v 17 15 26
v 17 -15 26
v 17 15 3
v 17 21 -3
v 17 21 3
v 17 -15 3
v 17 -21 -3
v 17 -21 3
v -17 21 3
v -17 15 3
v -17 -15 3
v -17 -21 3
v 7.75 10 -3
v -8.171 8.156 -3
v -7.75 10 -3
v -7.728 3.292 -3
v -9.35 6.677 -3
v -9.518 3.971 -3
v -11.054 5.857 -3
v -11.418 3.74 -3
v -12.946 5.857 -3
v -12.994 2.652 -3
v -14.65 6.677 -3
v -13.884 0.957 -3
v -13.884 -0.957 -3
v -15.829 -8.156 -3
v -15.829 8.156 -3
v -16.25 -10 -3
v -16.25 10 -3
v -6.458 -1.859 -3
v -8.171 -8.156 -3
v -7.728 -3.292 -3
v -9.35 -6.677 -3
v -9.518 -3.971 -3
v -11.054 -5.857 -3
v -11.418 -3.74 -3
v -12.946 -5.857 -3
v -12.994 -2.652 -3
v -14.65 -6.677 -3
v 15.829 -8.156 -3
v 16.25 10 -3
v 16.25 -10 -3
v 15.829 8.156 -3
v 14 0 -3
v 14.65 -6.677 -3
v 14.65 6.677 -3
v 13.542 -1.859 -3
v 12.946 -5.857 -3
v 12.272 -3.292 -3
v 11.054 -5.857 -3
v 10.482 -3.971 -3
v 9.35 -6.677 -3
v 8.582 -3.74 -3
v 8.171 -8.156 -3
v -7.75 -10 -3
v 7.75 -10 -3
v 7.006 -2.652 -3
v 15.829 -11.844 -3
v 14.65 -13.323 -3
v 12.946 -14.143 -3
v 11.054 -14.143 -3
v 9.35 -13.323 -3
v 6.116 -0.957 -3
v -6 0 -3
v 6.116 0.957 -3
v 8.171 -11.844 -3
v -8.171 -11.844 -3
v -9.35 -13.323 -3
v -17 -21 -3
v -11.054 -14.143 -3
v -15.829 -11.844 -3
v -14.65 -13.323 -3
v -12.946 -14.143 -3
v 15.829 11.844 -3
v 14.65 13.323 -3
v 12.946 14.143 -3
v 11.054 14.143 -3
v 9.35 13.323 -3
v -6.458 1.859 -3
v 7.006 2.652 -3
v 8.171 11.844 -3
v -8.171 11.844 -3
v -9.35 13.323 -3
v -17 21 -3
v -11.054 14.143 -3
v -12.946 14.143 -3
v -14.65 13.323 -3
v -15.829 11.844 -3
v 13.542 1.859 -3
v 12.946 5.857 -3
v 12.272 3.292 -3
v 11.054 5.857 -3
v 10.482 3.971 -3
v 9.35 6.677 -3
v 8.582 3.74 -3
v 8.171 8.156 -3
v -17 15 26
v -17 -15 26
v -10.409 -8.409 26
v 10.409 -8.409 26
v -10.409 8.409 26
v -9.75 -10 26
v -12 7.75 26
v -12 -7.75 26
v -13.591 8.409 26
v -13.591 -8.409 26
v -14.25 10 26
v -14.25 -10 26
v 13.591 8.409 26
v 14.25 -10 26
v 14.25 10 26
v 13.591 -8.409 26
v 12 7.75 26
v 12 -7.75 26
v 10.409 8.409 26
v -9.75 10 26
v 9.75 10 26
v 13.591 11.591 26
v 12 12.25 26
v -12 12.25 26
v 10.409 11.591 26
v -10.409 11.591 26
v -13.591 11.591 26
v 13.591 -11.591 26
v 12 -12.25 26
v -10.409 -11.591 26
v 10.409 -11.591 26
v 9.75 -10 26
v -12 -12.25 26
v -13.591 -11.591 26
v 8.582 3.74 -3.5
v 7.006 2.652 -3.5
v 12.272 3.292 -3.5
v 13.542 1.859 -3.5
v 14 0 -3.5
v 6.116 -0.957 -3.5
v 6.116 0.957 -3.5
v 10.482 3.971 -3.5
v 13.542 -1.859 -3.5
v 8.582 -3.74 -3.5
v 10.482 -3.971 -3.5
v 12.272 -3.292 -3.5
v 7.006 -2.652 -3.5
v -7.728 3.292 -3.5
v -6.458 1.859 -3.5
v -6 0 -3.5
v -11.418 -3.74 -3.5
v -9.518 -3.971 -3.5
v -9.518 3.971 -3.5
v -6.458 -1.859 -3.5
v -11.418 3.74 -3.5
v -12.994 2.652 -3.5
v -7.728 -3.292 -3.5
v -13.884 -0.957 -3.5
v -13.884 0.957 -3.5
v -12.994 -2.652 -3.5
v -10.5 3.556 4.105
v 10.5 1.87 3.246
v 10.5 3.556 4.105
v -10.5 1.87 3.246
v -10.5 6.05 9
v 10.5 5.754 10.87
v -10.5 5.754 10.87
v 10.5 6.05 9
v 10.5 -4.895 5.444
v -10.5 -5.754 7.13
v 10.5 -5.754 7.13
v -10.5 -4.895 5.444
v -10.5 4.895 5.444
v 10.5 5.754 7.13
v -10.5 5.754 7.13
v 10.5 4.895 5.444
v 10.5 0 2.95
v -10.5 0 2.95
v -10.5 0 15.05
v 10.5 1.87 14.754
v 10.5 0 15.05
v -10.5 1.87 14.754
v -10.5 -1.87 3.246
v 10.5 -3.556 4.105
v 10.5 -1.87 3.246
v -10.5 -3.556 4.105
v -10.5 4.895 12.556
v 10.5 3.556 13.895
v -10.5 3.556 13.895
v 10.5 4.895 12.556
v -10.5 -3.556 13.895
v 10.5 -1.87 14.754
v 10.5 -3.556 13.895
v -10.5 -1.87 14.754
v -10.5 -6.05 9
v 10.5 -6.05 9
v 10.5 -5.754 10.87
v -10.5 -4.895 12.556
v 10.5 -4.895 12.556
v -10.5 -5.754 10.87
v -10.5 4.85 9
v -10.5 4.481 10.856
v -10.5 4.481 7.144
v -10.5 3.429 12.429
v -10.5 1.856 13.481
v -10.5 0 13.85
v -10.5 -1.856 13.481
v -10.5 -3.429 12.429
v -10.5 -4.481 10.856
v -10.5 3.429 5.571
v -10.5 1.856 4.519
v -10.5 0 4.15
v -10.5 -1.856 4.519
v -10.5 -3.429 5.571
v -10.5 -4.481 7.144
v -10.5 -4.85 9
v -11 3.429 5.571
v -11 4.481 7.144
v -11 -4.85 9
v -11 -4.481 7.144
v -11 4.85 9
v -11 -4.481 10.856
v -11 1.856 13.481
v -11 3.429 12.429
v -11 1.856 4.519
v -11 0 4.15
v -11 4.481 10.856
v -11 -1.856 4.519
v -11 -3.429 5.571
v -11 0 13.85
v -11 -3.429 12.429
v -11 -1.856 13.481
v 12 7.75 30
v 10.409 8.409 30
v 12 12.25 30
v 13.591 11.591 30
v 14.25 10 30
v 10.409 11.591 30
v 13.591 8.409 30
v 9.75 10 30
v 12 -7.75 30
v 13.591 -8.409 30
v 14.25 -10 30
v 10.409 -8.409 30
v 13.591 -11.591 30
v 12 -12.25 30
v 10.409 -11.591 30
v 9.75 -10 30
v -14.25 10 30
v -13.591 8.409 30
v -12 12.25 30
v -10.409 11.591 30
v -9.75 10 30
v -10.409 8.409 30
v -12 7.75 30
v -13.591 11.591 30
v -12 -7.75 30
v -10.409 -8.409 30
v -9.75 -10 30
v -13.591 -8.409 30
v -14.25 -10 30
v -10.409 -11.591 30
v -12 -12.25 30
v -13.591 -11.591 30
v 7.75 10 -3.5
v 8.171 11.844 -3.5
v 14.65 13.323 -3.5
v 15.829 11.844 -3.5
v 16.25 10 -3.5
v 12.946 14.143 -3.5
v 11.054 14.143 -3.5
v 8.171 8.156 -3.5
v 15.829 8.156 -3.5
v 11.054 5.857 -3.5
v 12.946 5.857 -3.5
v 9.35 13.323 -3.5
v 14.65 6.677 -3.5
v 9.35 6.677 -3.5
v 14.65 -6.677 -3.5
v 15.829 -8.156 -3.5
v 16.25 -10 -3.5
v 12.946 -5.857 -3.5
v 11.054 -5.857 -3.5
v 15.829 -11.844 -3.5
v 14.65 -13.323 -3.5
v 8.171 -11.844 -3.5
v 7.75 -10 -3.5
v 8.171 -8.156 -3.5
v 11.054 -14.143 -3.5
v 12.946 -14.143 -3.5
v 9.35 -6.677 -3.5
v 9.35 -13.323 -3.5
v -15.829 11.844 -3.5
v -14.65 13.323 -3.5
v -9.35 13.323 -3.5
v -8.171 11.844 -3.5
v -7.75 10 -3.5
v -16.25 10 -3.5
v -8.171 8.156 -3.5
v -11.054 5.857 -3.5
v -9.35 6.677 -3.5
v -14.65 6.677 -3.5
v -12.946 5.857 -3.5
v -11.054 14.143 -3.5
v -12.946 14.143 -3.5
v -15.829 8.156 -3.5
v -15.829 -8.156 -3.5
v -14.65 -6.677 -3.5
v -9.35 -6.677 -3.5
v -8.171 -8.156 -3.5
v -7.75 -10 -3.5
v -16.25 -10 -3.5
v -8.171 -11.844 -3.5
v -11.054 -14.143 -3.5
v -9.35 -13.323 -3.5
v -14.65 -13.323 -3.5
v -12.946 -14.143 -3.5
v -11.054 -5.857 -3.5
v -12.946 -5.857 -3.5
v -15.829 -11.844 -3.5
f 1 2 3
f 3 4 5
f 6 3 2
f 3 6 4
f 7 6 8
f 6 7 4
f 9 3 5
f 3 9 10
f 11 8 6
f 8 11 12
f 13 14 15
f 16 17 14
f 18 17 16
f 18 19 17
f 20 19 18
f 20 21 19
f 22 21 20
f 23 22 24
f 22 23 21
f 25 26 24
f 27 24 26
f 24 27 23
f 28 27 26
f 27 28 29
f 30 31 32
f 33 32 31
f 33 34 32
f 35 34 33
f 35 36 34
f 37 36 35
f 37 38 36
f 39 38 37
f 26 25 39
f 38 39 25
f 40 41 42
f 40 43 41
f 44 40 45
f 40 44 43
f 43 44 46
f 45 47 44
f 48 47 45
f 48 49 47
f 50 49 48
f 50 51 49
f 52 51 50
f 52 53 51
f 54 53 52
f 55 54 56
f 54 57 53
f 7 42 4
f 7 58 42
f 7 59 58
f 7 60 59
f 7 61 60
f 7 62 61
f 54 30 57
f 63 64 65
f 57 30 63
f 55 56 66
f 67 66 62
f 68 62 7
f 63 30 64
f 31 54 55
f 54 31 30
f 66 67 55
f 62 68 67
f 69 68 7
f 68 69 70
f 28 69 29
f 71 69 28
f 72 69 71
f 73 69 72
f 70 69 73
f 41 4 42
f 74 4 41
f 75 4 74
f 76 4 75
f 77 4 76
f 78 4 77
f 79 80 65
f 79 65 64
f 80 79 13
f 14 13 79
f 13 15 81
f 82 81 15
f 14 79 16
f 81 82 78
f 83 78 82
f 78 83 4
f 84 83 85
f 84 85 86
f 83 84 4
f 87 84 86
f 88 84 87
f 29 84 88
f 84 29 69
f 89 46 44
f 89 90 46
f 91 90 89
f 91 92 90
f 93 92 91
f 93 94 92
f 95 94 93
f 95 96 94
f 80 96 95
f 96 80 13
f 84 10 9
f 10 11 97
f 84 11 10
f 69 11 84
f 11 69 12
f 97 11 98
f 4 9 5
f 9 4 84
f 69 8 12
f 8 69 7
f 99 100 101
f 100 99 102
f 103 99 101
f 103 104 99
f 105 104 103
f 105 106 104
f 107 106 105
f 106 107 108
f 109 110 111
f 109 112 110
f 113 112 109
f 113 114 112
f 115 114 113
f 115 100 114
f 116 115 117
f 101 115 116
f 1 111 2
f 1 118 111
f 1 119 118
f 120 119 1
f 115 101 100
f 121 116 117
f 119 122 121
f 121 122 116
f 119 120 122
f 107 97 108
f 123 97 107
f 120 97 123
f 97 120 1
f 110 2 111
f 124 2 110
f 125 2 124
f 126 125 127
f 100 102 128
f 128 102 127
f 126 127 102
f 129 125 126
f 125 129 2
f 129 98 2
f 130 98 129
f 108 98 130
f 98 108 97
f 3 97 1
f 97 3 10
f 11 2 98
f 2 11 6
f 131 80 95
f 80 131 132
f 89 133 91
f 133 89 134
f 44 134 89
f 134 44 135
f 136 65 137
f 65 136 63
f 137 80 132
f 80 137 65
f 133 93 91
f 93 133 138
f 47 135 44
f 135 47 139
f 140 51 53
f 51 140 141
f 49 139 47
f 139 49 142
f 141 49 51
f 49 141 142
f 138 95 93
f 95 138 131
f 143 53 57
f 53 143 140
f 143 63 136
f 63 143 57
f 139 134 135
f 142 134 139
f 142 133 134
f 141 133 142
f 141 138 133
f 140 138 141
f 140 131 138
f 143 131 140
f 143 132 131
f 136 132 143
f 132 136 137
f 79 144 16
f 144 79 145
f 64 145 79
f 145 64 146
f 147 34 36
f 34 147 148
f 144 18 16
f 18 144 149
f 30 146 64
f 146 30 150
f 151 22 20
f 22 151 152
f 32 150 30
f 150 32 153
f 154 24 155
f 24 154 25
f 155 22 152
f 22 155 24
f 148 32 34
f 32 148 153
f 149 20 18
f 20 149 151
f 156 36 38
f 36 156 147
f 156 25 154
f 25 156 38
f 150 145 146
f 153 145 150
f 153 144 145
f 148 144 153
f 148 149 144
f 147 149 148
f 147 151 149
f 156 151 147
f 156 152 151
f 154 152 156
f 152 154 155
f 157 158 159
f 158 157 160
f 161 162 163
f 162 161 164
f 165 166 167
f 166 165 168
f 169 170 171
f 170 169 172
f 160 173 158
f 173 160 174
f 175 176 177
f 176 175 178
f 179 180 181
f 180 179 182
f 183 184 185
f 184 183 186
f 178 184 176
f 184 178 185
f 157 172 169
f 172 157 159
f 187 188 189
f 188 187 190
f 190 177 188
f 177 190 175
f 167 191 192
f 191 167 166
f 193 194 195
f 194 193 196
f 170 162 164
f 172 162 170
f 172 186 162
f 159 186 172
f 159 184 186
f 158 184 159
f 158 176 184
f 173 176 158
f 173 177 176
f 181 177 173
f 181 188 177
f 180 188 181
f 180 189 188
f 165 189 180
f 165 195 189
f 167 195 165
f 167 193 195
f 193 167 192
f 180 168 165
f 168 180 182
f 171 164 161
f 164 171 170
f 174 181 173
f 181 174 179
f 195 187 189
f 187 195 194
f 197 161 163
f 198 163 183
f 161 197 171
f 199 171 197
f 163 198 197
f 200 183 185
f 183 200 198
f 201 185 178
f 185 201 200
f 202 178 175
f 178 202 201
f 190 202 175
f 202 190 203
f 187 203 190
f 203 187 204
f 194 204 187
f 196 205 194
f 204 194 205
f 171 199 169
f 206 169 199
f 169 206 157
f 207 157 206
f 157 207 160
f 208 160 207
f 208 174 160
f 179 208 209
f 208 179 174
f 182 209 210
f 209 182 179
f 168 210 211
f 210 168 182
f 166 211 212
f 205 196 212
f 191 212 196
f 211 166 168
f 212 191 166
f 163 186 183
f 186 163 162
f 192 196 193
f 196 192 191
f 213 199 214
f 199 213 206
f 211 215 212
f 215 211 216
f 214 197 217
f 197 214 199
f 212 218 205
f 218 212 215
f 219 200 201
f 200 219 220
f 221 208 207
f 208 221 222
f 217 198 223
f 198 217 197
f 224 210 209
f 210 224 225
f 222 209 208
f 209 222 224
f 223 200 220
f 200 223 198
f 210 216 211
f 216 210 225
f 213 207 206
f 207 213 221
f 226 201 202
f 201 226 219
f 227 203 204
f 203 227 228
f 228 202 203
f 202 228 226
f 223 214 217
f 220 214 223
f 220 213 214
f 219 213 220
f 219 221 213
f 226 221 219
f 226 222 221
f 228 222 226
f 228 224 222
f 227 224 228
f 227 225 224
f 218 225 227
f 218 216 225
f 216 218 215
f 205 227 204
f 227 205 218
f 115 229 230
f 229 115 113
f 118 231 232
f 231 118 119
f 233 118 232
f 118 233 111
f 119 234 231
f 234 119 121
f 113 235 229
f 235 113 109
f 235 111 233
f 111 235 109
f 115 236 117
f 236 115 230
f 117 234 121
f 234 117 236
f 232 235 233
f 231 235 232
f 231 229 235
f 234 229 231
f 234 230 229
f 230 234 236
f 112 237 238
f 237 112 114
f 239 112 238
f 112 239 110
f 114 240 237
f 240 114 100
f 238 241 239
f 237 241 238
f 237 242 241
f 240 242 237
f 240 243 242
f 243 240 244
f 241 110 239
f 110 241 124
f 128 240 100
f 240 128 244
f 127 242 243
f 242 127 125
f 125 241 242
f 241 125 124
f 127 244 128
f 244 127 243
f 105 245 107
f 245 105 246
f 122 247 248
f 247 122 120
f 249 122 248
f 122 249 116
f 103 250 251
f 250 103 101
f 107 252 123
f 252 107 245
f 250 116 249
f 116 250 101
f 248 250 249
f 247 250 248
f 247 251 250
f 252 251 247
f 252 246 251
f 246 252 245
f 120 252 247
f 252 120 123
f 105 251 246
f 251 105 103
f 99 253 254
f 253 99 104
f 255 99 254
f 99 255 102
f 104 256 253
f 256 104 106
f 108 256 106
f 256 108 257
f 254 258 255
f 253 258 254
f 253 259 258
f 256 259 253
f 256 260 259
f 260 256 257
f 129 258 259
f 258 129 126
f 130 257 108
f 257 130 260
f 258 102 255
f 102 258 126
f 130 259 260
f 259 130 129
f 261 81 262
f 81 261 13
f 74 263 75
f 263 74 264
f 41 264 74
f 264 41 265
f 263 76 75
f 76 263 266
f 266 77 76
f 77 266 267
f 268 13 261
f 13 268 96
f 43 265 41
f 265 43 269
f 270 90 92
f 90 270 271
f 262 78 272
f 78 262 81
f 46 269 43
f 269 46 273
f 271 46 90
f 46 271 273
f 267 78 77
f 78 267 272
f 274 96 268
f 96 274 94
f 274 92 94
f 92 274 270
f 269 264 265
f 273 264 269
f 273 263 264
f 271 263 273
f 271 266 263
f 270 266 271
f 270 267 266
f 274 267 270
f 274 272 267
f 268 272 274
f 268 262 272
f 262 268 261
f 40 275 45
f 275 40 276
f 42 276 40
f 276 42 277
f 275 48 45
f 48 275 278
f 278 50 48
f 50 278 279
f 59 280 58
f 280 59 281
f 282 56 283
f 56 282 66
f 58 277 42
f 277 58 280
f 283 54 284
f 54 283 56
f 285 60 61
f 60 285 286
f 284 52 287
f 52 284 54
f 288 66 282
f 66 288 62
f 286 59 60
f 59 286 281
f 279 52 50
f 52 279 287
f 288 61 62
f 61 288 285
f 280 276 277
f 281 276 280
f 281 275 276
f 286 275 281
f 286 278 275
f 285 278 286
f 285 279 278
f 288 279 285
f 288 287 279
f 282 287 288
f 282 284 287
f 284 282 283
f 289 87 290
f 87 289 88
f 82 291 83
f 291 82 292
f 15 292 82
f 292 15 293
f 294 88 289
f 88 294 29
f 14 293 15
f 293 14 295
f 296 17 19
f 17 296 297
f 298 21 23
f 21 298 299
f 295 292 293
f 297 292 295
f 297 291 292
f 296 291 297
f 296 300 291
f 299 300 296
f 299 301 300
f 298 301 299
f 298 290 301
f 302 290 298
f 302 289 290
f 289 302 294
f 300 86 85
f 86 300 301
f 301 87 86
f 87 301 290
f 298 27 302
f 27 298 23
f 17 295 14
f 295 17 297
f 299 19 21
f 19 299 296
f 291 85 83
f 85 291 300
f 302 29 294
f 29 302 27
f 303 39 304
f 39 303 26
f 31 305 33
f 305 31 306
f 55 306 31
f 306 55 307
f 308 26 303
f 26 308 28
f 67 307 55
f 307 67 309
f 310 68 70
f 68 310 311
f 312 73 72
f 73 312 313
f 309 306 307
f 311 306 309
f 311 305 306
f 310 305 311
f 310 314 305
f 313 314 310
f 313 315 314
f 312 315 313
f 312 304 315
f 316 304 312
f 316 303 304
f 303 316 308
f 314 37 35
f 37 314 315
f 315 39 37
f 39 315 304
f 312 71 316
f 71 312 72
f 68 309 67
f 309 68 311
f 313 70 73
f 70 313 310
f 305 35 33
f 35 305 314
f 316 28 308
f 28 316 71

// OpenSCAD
// Parameters
shaft_diameter = 6; //[3:12:0.1]
block_length = 34; //[17:68:0.5]
block_width = 30; //[15:60:0.5]
block_height = 24; //[12:48:0.5]
base_flange_thickness = 6; //[3:12:0.5]
base_flange_overhang_y = 6; //[3:12:0.5]
bearing_outer_diameter = 12; //[8:24:0.1]
bearing_length = 19; //[10:38:0.5]
bore_diameter = 12.1; //[11.5:12.6:0.01]
bore_center_height_from_base = 12; //[8:20:0.5]
bore_length_extra = 2; //[0.5:6:0.5]
bearing_retention_lip_depth = 1.2; //[0.5:3:0.1]
bearing_retention_lip_length = 2; //[1:6:0.5]
mount_hole_diameter = 4.5; //[3:8:0.1]
mount_hole_spacing_x = 24; //[12:30:0.5]
mount_hole_spacing_y = 20; //[10:30:0.5]
counterbore_diameter = 8.5; //[6:14:0.1]
counterbore_depth = 3; //[1:6:0.5]
alignment_boss_diameter = 8; //[4:16:0.5]
alignment_boss_height = 1.5; //[0.5:4:0.25]
alignment_boss_offset_x = 10; //[6:14:0.5]
overlap = 1; //[0.5:2:0.1]

// SBR Bearing Block Assembly
module sbr_bearing_block_assembly() {
  color("Silver") {
    union() {
      // Base flange
      translate([0, 0, 0])
        cube([block_length, block_width + 2 * base_flange_overhang_y, base_flange_thickness], center=true);
      
      // Bearing block body
      translate([0, 0, base_flange_thickness/2 + block_height/2 - overlap])
        cube([block_length, block_width, block_height], center=true);
      
      // Alignment bosses
      translate([alignment_boss_offset_x, 0, -base_flange_thickness/2 - alignment_boss_height/2 + overlap])
        cylinder(r=alignment_boss_diameter/2, h=alignment_boss_height, center=true);
      translate([-alignment_boss_offset_x, 0, -base_flange_thickness/2 - alignment_boss_height/2 + overlap])
        cylinder(r=alignment_boss_diameter/2, h=alignment_boss_height, center=true);
    }
  }
}

// SCS Bearing Block
module scs_bearing_block() {
  color("DimGray") {
    difference() {
      sbr_bearing_block_assembly();
      
      // Central bearing bore
      translate([0, 0, -base_flange_thickness/2 + bore_center_height_from_base])
        rotate([0, 90, 0])
        cylinder(r=bore_diameter/2, h=bearing_length + bore_length_extra, center=true);
      
      // Bearing retention lip cut
      translate([-(bearing_length + bore_length_extra)/2 + bearing_retention_lip_length/2, 0, -base_flange_thickness/2 + bore_center_height_from_base])
        rotate([0, 90, 0])
        cylinder(r=(bore_diameter/2) - bearing_retention_lip_depth, h=bearing_retention_lip_length + overlap, center=true);
    }
  }
}

// SBR Bearing Block
module sbr_bearing_block() {
  color("Black") {
    scs_bearing_block();
  }
}

// SCS Bearing Block Hole Positions
module scs_bearing_block_hole_positions() {
  color("Silver") {
    union() {
      // Mount holes
      translate([mount_hole_spacing_x/2, mount_hole_spacing_y/2, base_flange_thickness/2 + block_height/2 - overlap])
        cylinder(r=mount_hole_diameter/2, h=base_flange_thickness + block_height + 2*overlap, center=true);
      translate([mount_hole_spacing_x/2, -mount_hole_spacing_y/2, base_flange_thickness/2 + block_height/2 - overlap])
        cylinder(r=mount_hole_diameter/2, h=base_flange_thickness + block_height + 2*overlap, center=true);
      translate([-mount_hole_spacing_x/2, mount_hole_spacing_y/2, base_flange_thickness/2 + block_height/2 - overlap])
        cylinder(r=mount_hole_diameter/2, h=base_flange_thickness + block_height + 2*overlap, center=true);
      translate([-mount_hole_spacing_x/2, -mount_hole_spacing_y/2, base_flange_thickness/2 + block_height/2 - overlap])
        cylinder(r=mount_hole_diameter/2, h=base_flange_thickness + block_height + 2*overlap, center=true);
      
      // Counterbores
      translate([mount_hole_spacing_x/2, mount_hole_spacing_y/2, -base_flange_thickness/2 + counterbore_depth/2])
        cylinder(r=counterbore_diameter/2, h=counterbore_depth + overlap, center=true);
      translate([mount_hole_spacing_x/2, -mount_hole_spacing_y/2, -base_flange_thickness/2 + counterbore_depth/2])
        cylinder(r=counterbore_diameter/2, h=counterbore_depth + overlap, center=true);
      translate([-mount_hole_spacing_x/2, mount_hole_spacing_y/2, -base_flange_thickness/2 + counterbore_depth/2])
        cylinder(r=counterbore_diameter/2, h=counterbore_depth + overlap, center=true);
      translate([-mount_hole_spacing_x/2, -mount_hole_spacing_y/2, -base_flange_thickness/2 + counterbore_depth/2])
        cylinder(r=counterbore_diameter/2, h=counterbore_depth + overlap, center=true);
    }
  }
}

// Assembly
module assembly() {
  sbr_bearing_block();
  scs_bearing_block_hole_positions();
}

assembly();
